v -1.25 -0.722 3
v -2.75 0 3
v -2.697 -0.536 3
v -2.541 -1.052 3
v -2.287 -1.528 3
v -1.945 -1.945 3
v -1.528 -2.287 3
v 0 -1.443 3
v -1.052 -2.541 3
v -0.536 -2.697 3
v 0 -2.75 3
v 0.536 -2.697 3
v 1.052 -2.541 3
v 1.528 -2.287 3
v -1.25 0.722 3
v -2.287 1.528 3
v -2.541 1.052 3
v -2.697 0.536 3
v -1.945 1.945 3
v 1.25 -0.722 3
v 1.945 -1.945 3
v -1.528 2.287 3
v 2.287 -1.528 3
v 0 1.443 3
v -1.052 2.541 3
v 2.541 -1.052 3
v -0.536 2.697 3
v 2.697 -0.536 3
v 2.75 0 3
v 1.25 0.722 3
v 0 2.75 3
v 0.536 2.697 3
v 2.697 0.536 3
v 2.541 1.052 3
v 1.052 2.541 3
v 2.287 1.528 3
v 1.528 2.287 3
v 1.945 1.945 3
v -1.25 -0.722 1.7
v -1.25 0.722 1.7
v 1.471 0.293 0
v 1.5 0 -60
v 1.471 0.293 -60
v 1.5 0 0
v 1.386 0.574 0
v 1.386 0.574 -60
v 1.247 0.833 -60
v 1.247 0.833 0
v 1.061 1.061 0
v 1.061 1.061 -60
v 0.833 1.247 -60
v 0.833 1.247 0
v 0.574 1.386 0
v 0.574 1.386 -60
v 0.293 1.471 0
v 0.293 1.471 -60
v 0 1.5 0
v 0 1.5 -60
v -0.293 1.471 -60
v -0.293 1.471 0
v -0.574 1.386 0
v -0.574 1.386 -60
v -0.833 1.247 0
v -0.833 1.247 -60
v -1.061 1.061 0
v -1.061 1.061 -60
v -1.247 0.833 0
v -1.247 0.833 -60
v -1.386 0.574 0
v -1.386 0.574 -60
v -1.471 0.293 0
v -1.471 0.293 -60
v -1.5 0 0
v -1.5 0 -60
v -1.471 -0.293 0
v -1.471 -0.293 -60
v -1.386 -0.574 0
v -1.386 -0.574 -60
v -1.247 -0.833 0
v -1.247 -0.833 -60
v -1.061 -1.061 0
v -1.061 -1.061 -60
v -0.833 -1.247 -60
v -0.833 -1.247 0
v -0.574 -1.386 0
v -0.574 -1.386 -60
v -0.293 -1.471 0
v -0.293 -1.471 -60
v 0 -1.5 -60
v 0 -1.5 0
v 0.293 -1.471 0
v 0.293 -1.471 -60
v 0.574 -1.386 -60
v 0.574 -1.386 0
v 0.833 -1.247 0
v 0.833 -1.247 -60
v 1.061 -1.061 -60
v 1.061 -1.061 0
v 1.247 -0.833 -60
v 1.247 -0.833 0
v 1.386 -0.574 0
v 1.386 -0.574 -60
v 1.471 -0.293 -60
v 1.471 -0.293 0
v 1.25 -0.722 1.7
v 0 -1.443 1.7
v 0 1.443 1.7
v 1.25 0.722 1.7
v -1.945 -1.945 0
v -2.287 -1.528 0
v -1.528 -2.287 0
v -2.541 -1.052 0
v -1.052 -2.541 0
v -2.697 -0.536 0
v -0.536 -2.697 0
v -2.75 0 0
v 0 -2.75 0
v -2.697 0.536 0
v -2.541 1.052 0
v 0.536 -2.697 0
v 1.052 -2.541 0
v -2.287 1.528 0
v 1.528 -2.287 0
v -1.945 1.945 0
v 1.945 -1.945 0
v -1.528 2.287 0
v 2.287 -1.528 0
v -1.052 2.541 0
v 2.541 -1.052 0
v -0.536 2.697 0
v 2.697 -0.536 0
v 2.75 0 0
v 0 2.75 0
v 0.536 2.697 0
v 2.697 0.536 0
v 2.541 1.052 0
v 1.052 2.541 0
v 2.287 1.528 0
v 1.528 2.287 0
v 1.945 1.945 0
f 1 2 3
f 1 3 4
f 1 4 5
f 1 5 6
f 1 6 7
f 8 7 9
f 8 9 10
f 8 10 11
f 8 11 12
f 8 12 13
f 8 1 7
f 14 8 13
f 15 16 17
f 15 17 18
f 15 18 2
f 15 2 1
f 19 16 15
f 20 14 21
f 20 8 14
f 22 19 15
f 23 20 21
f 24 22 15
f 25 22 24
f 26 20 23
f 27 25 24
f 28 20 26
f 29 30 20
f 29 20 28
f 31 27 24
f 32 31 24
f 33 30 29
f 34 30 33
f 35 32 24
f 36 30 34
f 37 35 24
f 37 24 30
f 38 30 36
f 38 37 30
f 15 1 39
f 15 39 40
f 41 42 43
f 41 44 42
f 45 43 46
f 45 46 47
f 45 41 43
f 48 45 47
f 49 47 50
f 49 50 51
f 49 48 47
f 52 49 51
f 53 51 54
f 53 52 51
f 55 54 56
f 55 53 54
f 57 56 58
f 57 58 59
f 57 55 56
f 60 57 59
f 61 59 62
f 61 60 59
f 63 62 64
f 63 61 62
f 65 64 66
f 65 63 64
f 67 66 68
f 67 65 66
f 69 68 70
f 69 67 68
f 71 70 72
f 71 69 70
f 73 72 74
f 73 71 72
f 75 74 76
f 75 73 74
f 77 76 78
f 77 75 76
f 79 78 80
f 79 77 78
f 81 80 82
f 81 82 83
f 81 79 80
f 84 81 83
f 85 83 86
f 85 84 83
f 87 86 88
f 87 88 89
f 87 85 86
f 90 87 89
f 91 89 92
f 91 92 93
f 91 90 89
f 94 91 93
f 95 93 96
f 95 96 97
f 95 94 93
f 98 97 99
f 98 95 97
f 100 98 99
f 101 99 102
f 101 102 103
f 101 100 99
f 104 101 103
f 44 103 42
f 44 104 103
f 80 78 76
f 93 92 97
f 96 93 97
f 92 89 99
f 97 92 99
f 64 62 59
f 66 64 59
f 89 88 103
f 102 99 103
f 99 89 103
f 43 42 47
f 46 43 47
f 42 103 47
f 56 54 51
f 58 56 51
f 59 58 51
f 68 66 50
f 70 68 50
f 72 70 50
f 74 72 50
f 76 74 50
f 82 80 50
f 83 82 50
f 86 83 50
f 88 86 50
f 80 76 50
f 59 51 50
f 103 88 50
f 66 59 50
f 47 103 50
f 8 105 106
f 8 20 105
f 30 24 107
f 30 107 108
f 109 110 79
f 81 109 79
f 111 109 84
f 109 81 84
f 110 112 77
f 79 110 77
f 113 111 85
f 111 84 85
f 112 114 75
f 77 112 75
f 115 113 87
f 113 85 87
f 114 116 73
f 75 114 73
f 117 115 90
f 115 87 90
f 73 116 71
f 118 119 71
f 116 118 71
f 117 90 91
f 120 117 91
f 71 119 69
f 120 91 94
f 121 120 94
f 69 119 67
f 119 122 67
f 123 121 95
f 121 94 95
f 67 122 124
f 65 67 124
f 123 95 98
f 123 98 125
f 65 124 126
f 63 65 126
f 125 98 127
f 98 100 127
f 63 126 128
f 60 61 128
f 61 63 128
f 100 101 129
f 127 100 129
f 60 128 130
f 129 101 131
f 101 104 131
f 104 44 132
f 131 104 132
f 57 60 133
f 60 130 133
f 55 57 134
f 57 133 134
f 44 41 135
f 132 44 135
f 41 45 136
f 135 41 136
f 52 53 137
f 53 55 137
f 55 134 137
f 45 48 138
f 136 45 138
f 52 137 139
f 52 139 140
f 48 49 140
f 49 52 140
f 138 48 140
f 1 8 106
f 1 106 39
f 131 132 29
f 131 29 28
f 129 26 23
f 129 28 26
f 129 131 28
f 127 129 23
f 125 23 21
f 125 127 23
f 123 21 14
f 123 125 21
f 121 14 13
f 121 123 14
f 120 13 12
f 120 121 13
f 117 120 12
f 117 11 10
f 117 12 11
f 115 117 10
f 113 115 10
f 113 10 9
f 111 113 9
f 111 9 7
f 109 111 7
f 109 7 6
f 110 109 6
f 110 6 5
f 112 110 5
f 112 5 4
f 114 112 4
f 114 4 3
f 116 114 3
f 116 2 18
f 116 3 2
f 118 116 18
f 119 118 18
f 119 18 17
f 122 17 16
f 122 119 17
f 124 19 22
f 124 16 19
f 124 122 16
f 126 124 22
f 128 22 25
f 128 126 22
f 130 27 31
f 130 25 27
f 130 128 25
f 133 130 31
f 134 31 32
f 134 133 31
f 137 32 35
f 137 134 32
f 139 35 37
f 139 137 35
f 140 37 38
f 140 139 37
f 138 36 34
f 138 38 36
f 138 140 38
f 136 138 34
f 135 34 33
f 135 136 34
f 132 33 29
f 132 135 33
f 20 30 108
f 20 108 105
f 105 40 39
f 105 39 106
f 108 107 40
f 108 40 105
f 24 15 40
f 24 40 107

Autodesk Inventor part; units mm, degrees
ref_plane "YZ Plane" through (0, 0, 0) normal (1, 0, 0) x (0, 1, 0)
ref_plane "XZ Plane" through (0, 0, 0) normal (0, 1, 0) x (-1, 0, 0)
ref_plane "XY Plane" through (0, 0, 0) normal (0, 0, 1) x (1, 0, 0)
sketch "スケッチ1" plane through (0, 0, 0) normal (0, 0, 1) x (1, 0, 0)
  circle A0 centre (0, 0) radius 1.5
  dimension "d0" = 3
extrude "押し出し1" add sketch "スケッチ1" against normal blind 60
sketch "スケッチ2" plane through (0, 0, 0) normal (0, 0, 1) x (1, 0, 0)
  circle A0 centre (0, 0) radius 2.75
  dimension "d3" = 5.5
extrude "押し出し2" add sketch "スケッチ2" along normal blind 3
sketch "スケッチ3" plane through (0, 0, 3) normal (0, 0, 1) x (1, 0, 0)
  line L0 (0, 1.4434) -> (1.25, 0.7217)
  line L1 (1.25, 0.7217) -> (1.25, -0.7217)
  line L2 (1.25, -0.7217) -> (0, -1.4434)
  line L3 (0, -1.4434) -> (-1.25, -0.7217)
  line L4 (-1.25, -0.7217) -> (-1.25, 0.7217)
  line L5 (-1.25, 0.7217) -> (0, 1.4434)
  point P0 (0, 0)
  point P1 (0, 0)
  dimension "d6" = 2.5
extrude "押し出し3" cut sketch "スケッチ3" against normal blind 1.3
thread "ねじ1" size "M3x0.5" class "6g" standard "ANSI Metric M Profile" full length
properties part number "M3キャップボルト 20" material "鋼、高強度、低合金"
